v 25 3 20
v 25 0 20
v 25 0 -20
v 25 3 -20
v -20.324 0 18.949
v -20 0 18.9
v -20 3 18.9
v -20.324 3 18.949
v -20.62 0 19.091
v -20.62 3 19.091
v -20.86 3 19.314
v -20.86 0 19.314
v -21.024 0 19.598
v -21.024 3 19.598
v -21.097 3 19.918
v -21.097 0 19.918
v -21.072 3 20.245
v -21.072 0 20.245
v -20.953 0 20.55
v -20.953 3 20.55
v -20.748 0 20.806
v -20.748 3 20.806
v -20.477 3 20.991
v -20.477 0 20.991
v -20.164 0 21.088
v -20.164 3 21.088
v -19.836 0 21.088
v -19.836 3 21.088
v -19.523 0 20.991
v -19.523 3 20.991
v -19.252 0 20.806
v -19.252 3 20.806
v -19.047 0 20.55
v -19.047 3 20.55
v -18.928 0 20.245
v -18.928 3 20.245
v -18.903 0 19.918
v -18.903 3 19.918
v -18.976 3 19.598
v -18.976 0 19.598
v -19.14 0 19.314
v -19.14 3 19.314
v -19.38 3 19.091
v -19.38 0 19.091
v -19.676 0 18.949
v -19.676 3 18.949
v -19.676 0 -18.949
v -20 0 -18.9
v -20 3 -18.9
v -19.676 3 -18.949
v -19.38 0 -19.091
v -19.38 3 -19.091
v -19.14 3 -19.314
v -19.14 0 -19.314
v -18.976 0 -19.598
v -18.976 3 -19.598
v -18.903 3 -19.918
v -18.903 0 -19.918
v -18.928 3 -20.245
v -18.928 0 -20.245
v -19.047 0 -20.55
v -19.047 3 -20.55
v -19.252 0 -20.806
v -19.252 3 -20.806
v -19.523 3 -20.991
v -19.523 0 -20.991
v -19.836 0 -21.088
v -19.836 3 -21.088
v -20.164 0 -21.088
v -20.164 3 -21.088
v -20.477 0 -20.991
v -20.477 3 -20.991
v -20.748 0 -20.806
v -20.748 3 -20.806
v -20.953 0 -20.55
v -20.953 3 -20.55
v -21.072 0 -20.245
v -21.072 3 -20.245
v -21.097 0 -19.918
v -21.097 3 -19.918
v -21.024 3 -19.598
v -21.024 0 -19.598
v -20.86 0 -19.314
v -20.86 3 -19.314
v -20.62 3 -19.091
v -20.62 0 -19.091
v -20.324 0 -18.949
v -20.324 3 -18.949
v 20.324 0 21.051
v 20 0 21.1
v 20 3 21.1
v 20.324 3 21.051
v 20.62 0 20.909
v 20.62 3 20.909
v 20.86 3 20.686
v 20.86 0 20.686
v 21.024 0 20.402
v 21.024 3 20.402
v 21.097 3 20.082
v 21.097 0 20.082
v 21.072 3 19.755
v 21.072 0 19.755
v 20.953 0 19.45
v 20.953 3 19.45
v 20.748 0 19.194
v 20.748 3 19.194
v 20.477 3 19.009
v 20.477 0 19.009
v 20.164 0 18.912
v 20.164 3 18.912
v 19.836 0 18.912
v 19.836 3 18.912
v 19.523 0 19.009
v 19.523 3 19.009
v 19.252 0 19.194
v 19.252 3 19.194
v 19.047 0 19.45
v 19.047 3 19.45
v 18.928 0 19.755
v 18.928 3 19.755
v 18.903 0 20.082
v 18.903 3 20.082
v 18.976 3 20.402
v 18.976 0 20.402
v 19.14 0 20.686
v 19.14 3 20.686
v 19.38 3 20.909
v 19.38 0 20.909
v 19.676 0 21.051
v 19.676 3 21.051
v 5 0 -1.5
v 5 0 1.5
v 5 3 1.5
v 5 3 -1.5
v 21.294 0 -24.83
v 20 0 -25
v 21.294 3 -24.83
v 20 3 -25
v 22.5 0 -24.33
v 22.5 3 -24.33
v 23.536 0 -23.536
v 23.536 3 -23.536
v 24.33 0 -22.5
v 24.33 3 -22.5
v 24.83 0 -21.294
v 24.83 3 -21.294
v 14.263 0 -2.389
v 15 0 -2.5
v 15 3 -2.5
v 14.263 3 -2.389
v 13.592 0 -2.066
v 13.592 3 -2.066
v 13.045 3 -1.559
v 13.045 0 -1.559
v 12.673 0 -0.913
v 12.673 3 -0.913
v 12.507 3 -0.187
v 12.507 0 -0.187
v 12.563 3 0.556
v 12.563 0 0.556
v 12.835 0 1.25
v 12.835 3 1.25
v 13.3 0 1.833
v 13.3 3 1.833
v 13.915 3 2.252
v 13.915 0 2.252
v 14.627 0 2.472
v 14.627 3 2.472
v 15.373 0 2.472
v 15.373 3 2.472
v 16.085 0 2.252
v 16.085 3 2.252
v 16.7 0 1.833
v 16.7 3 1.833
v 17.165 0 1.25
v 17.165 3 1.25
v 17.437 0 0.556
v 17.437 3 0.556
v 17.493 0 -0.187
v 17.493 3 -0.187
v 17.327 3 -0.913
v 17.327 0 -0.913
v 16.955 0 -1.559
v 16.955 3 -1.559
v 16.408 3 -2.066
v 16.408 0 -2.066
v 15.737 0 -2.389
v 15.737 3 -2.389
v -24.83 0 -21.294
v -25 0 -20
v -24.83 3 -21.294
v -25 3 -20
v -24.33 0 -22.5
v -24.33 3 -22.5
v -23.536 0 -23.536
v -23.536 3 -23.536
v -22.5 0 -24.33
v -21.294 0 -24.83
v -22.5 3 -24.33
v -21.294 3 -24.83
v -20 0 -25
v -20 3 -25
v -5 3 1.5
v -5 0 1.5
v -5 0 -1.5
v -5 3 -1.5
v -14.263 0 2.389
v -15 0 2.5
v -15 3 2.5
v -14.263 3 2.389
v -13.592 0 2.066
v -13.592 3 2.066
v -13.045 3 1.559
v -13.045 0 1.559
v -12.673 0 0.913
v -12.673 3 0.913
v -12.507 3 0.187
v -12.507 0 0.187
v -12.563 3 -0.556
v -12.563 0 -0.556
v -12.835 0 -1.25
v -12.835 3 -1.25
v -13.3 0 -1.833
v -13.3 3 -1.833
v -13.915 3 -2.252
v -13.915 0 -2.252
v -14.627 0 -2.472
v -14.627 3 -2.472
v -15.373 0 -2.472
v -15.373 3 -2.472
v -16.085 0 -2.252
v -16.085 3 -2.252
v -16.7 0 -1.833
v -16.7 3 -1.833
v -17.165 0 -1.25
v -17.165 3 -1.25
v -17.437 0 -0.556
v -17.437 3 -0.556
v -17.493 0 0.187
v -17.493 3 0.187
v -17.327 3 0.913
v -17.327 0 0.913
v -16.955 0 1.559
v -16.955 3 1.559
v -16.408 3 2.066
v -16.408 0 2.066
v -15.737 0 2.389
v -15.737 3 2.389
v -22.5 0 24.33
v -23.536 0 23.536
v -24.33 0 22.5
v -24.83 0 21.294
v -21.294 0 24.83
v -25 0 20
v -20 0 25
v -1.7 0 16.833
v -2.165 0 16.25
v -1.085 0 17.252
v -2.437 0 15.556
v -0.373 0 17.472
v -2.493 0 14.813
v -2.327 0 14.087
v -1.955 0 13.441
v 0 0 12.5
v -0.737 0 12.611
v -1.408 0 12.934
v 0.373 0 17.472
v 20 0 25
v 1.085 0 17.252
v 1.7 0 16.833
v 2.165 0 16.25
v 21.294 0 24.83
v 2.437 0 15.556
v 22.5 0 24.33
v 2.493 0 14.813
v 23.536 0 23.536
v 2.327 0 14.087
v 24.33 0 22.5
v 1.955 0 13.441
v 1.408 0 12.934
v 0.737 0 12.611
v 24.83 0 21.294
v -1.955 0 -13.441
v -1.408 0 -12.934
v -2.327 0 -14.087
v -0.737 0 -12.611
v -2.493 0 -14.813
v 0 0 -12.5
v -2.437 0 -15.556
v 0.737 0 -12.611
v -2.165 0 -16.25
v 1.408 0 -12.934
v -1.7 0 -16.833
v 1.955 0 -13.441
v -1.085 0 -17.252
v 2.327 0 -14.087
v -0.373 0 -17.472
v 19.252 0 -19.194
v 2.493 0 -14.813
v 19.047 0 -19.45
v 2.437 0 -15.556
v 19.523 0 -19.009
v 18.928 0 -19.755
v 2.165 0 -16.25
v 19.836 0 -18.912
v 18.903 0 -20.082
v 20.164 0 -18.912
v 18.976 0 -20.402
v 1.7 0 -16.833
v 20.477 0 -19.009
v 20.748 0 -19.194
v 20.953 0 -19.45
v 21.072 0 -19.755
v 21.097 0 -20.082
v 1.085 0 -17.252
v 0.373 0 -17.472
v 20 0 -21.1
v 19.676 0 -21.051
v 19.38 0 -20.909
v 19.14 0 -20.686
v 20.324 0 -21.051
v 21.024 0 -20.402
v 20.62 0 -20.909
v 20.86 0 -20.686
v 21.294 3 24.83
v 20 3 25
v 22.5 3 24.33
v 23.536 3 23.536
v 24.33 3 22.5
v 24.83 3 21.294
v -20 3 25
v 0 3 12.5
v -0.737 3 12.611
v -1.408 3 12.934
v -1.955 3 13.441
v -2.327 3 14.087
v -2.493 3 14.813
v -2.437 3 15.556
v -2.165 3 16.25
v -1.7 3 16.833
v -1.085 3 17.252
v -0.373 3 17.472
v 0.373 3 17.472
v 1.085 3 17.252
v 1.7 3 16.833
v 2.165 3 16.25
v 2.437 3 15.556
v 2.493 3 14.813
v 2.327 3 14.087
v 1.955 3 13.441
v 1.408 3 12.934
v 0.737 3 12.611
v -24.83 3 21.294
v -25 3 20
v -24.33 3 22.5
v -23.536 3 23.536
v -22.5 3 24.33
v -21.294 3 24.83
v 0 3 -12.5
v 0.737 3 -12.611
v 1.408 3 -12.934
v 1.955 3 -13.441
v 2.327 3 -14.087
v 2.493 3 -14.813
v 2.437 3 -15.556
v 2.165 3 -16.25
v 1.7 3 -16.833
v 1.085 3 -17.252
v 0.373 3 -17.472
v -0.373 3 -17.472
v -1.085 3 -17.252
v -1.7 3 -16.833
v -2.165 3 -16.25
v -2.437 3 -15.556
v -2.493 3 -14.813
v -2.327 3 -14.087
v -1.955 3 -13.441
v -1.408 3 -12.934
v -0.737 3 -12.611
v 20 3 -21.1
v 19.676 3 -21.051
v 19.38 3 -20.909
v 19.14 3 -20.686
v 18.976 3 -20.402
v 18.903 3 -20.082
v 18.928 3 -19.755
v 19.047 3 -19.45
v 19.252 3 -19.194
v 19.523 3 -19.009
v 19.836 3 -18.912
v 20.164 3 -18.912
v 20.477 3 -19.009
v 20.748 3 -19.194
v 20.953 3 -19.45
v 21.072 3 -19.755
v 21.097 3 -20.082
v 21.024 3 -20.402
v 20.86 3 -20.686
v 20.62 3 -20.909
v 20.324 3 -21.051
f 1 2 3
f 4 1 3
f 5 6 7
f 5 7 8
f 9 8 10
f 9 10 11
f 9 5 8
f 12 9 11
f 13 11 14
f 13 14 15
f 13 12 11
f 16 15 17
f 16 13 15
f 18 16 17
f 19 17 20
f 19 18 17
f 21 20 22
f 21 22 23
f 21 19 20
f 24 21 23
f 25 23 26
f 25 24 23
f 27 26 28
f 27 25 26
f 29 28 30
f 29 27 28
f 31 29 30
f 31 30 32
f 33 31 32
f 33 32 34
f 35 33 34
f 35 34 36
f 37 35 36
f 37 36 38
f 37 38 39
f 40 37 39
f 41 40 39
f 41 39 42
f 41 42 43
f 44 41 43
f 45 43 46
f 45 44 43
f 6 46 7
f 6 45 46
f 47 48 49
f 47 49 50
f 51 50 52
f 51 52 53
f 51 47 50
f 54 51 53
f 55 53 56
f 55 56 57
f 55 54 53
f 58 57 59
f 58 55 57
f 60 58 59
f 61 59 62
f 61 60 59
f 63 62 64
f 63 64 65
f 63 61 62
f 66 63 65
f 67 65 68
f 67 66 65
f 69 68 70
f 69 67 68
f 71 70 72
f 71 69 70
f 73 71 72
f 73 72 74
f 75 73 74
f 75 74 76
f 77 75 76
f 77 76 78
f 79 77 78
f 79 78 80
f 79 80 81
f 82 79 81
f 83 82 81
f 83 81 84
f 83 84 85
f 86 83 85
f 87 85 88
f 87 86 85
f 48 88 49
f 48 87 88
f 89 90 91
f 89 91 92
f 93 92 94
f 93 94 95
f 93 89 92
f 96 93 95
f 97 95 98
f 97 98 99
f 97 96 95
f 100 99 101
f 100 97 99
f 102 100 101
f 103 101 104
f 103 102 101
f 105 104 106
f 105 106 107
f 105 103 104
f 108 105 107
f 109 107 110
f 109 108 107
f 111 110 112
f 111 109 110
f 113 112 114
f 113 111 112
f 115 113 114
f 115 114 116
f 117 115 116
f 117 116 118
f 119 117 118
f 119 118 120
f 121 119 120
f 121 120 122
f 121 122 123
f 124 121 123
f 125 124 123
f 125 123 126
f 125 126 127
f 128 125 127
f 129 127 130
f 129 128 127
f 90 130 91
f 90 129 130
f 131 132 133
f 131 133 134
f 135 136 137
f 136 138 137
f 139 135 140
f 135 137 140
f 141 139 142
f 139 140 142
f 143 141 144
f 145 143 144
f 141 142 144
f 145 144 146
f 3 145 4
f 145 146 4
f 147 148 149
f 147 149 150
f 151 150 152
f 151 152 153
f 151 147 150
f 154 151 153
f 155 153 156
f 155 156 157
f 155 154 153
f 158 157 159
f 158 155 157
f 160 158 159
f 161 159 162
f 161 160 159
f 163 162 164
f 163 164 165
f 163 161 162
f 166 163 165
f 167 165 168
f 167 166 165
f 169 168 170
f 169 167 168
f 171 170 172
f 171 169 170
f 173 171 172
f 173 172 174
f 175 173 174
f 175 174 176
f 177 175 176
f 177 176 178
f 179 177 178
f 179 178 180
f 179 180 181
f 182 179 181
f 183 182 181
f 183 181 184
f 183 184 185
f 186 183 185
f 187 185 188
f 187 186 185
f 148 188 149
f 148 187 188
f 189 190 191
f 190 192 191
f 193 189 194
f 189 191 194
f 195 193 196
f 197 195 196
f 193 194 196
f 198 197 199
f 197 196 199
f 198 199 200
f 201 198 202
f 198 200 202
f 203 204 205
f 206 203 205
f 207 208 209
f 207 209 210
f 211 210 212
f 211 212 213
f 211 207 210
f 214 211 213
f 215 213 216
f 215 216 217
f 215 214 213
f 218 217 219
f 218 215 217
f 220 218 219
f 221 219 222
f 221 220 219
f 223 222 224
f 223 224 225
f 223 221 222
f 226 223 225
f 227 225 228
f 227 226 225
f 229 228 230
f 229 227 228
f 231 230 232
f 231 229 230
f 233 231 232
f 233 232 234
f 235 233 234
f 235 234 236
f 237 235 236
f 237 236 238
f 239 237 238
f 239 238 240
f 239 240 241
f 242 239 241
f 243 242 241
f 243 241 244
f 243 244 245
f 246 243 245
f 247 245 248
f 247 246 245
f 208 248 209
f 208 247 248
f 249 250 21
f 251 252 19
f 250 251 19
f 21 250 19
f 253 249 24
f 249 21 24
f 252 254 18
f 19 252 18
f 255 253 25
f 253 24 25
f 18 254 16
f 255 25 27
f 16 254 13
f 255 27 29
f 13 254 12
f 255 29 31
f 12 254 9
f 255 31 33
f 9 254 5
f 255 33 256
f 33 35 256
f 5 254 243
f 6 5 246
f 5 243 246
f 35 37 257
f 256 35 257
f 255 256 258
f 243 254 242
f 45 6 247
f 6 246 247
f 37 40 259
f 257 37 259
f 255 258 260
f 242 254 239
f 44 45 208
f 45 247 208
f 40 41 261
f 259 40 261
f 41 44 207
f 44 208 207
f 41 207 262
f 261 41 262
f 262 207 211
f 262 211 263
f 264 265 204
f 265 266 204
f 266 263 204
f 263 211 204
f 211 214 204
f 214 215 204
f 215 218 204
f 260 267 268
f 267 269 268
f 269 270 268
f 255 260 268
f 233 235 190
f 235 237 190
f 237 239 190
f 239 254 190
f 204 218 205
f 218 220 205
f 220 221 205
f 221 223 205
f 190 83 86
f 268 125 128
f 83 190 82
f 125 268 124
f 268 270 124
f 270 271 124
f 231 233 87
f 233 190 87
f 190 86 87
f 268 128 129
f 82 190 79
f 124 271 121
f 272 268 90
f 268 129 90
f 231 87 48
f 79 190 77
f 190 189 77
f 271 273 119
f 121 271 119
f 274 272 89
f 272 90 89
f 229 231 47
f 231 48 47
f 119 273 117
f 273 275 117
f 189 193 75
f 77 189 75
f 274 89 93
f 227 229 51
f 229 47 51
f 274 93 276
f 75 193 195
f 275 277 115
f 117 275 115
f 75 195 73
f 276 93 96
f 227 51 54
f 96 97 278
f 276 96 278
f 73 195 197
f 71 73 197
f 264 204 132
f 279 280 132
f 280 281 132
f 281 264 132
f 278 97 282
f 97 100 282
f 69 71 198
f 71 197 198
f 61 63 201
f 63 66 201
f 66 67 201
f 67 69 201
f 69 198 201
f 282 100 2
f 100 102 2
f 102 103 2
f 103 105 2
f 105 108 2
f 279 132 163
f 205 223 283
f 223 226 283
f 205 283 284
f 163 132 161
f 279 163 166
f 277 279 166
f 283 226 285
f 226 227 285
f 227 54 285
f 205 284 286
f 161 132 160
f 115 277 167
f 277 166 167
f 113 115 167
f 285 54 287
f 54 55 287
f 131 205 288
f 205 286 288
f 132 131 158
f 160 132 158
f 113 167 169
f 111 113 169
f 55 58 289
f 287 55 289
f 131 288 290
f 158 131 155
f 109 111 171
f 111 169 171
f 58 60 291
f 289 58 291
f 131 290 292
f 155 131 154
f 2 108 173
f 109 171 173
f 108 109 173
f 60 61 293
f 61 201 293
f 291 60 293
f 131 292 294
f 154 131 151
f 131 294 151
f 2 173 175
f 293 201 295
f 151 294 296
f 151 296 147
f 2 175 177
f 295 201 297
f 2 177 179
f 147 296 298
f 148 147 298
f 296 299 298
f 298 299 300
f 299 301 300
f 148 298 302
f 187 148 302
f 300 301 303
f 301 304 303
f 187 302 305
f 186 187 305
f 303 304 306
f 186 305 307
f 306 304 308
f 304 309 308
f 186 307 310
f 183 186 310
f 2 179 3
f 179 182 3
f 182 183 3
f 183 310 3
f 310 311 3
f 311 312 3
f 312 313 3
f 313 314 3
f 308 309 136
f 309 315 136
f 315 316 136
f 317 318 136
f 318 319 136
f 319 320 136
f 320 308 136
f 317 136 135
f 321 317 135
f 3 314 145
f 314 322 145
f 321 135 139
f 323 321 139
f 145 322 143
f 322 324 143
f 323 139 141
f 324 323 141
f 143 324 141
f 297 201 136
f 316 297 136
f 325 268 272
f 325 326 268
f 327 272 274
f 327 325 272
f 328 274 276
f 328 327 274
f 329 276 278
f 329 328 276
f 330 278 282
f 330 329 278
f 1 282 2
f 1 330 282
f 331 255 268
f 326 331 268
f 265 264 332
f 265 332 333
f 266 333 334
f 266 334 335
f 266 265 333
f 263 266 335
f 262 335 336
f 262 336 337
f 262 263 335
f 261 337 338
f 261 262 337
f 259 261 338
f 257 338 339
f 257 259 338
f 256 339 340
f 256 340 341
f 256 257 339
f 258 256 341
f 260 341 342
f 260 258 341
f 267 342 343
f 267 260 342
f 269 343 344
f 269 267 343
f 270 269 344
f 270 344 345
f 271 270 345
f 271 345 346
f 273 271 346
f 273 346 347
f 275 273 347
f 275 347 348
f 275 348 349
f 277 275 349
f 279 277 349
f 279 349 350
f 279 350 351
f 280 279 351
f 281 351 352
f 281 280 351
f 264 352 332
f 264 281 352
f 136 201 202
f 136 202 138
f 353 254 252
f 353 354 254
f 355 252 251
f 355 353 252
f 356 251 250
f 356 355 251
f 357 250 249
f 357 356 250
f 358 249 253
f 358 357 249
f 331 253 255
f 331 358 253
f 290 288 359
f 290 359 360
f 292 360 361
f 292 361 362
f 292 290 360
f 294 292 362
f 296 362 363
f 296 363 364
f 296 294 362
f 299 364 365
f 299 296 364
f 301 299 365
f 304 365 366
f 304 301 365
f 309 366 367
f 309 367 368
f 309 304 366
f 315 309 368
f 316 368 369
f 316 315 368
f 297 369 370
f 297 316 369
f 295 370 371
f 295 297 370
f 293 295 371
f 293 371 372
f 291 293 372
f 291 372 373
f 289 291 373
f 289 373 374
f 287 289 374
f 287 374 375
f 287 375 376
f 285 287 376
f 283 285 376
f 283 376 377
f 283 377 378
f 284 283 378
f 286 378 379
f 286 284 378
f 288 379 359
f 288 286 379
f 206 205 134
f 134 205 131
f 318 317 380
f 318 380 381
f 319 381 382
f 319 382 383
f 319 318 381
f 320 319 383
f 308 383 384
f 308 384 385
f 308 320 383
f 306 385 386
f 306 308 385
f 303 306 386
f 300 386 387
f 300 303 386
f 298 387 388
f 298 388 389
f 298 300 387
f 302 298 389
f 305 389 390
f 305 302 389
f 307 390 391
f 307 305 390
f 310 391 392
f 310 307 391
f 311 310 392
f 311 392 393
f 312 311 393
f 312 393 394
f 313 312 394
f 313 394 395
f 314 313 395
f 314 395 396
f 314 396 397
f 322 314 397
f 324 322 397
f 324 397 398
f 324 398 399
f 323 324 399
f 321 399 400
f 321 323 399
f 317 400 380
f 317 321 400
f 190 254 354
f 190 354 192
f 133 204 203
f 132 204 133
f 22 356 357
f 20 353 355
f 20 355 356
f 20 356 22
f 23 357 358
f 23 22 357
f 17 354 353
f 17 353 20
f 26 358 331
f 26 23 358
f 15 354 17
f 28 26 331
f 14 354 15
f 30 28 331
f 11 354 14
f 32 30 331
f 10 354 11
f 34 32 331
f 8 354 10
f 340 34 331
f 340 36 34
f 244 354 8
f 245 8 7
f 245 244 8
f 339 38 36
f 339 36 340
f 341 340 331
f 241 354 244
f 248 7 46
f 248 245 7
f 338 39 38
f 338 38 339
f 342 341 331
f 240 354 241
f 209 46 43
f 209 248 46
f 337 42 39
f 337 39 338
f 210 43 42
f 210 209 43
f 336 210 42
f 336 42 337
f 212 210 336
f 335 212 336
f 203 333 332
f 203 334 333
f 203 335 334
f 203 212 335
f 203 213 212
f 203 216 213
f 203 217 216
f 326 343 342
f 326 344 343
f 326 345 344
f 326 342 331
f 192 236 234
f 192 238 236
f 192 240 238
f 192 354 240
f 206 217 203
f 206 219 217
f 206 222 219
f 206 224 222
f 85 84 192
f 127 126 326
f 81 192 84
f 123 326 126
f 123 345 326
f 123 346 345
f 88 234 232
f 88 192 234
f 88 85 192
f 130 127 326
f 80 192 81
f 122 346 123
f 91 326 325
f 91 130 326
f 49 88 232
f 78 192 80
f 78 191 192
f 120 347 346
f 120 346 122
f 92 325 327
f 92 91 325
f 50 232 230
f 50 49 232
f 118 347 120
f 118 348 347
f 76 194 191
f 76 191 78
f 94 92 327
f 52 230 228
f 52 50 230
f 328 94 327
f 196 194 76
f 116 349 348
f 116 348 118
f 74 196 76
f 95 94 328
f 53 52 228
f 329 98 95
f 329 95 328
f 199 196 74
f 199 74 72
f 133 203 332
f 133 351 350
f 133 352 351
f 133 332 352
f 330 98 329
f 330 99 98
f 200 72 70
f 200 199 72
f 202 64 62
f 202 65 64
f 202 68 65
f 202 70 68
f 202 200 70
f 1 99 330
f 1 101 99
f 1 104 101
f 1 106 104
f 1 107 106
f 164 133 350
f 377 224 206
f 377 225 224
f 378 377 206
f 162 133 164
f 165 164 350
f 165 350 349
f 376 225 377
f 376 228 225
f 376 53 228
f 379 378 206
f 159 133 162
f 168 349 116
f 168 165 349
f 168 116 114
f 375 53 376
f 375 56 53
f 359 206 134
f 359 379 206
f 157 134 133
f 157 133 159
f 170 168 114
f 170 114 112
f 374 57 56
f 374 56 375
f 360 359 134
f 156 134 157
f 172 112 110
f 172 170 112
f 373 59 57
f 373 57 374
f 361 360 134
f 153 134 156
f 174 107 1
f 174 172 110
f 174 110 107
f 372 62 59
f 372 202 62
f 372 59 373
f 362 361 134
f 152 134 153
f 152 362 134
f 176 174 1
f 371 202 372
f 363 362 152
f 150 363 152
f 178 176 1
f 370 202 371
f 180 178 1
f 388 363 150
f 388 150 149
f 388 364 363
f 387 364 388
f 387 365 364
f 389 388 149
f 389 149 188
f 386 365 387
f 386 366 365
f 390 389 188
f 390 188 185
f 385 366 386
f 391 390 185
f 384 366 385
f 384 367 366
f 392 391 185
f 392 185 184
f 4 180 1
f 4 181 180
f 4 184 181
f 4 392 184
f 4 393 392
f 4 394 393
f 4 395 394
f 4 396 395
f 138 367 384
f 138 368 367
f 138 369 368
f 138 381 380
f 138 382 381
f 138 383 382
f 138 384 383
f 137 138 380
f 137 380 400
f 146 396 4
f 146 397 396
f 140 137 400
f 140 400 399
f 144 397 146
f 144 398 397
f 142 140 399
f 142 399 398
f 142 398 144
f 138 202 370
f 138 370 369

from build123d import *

# Parameters (mm, degrees)
SKETCH1_W           = 50
SKETCH1_H           = 50
SKETCH1_R           = 2.5
SKETCH1_R_2         = 1.1
SKETCH1_W_2         = 10
SKETCH1_H_2         = 3
BOSS_EXTRUDE1_DEPTH = 3
FILLET1_R           = 5


with BuildPart() as part:
    # Sketch1 → Boss-Extrude1 (new body)
    with BuildSketch(Plane(origin=(0, 0, 0), x_dir=(1, 0, 0), z_dir=(0, 1, 0))):
        Rectangle(SKETCH1_W, SKETCH1_H)
        with Locations(Location((-15, 0, 0), (0, 0, 270))):
            Circle(SKETCH1_R, mode=Mode.SUBTRACT)
        with Locations(Location((15, 0, 0), (0, 0, 90))):
            Circle(SKETCH1_R, mode=Mode.SUBTRACT)
        with Locations(Location((-20, 20, 0), (0, 0, 270))):
            Circle(SKETCH1_R_2, mode=Mode.SUBTRACT)
        with Locations(Location((20, 20, 0), (0, 0, 90))):
            Circle(SKETCH1_R_2, mode=Mode.SUBTRACT)
        with Locations(Location((20, -20, 0), (0, 0, 270))):
            Circle(SKETCH1_R_2, mode=Mode.SUBTRACT)
        with Locations(Location((-20, -20, 0), (0, 0, 90))):
            Circle(SKETCH1_R_2, mode=Mode.SUBTRACT)
        with Locations(Location((0, 15, 0), (0, 0, 270))):
            Circle(SKETCH1_R, mode=Mode.SUBTRACT)
        with Locations(Location((0, -15, 0), (0, 0, 90))):
            Circle(SKETCH1_R, mode=Mode.SUBTRACT)
        Rectangle(SKETCH1_W_2, SKETCH1_H_2, mode=Mode.SUBTRACT)
    extrude(amount=BOSS_EXTRUDE1_DEPTH)

    # Fillet1
    fillet1_edges = [part.edges().sort_by_distance(p)[0] for p in [
        (25, 1.5, 25),
        (-25, 1.5, 25),
        (-25, 1.5, -25),
        (25, 1.5, -25),
    ]]
    fillet(fillet1_edges, radius=FILLET1_R)


solid = part.part
